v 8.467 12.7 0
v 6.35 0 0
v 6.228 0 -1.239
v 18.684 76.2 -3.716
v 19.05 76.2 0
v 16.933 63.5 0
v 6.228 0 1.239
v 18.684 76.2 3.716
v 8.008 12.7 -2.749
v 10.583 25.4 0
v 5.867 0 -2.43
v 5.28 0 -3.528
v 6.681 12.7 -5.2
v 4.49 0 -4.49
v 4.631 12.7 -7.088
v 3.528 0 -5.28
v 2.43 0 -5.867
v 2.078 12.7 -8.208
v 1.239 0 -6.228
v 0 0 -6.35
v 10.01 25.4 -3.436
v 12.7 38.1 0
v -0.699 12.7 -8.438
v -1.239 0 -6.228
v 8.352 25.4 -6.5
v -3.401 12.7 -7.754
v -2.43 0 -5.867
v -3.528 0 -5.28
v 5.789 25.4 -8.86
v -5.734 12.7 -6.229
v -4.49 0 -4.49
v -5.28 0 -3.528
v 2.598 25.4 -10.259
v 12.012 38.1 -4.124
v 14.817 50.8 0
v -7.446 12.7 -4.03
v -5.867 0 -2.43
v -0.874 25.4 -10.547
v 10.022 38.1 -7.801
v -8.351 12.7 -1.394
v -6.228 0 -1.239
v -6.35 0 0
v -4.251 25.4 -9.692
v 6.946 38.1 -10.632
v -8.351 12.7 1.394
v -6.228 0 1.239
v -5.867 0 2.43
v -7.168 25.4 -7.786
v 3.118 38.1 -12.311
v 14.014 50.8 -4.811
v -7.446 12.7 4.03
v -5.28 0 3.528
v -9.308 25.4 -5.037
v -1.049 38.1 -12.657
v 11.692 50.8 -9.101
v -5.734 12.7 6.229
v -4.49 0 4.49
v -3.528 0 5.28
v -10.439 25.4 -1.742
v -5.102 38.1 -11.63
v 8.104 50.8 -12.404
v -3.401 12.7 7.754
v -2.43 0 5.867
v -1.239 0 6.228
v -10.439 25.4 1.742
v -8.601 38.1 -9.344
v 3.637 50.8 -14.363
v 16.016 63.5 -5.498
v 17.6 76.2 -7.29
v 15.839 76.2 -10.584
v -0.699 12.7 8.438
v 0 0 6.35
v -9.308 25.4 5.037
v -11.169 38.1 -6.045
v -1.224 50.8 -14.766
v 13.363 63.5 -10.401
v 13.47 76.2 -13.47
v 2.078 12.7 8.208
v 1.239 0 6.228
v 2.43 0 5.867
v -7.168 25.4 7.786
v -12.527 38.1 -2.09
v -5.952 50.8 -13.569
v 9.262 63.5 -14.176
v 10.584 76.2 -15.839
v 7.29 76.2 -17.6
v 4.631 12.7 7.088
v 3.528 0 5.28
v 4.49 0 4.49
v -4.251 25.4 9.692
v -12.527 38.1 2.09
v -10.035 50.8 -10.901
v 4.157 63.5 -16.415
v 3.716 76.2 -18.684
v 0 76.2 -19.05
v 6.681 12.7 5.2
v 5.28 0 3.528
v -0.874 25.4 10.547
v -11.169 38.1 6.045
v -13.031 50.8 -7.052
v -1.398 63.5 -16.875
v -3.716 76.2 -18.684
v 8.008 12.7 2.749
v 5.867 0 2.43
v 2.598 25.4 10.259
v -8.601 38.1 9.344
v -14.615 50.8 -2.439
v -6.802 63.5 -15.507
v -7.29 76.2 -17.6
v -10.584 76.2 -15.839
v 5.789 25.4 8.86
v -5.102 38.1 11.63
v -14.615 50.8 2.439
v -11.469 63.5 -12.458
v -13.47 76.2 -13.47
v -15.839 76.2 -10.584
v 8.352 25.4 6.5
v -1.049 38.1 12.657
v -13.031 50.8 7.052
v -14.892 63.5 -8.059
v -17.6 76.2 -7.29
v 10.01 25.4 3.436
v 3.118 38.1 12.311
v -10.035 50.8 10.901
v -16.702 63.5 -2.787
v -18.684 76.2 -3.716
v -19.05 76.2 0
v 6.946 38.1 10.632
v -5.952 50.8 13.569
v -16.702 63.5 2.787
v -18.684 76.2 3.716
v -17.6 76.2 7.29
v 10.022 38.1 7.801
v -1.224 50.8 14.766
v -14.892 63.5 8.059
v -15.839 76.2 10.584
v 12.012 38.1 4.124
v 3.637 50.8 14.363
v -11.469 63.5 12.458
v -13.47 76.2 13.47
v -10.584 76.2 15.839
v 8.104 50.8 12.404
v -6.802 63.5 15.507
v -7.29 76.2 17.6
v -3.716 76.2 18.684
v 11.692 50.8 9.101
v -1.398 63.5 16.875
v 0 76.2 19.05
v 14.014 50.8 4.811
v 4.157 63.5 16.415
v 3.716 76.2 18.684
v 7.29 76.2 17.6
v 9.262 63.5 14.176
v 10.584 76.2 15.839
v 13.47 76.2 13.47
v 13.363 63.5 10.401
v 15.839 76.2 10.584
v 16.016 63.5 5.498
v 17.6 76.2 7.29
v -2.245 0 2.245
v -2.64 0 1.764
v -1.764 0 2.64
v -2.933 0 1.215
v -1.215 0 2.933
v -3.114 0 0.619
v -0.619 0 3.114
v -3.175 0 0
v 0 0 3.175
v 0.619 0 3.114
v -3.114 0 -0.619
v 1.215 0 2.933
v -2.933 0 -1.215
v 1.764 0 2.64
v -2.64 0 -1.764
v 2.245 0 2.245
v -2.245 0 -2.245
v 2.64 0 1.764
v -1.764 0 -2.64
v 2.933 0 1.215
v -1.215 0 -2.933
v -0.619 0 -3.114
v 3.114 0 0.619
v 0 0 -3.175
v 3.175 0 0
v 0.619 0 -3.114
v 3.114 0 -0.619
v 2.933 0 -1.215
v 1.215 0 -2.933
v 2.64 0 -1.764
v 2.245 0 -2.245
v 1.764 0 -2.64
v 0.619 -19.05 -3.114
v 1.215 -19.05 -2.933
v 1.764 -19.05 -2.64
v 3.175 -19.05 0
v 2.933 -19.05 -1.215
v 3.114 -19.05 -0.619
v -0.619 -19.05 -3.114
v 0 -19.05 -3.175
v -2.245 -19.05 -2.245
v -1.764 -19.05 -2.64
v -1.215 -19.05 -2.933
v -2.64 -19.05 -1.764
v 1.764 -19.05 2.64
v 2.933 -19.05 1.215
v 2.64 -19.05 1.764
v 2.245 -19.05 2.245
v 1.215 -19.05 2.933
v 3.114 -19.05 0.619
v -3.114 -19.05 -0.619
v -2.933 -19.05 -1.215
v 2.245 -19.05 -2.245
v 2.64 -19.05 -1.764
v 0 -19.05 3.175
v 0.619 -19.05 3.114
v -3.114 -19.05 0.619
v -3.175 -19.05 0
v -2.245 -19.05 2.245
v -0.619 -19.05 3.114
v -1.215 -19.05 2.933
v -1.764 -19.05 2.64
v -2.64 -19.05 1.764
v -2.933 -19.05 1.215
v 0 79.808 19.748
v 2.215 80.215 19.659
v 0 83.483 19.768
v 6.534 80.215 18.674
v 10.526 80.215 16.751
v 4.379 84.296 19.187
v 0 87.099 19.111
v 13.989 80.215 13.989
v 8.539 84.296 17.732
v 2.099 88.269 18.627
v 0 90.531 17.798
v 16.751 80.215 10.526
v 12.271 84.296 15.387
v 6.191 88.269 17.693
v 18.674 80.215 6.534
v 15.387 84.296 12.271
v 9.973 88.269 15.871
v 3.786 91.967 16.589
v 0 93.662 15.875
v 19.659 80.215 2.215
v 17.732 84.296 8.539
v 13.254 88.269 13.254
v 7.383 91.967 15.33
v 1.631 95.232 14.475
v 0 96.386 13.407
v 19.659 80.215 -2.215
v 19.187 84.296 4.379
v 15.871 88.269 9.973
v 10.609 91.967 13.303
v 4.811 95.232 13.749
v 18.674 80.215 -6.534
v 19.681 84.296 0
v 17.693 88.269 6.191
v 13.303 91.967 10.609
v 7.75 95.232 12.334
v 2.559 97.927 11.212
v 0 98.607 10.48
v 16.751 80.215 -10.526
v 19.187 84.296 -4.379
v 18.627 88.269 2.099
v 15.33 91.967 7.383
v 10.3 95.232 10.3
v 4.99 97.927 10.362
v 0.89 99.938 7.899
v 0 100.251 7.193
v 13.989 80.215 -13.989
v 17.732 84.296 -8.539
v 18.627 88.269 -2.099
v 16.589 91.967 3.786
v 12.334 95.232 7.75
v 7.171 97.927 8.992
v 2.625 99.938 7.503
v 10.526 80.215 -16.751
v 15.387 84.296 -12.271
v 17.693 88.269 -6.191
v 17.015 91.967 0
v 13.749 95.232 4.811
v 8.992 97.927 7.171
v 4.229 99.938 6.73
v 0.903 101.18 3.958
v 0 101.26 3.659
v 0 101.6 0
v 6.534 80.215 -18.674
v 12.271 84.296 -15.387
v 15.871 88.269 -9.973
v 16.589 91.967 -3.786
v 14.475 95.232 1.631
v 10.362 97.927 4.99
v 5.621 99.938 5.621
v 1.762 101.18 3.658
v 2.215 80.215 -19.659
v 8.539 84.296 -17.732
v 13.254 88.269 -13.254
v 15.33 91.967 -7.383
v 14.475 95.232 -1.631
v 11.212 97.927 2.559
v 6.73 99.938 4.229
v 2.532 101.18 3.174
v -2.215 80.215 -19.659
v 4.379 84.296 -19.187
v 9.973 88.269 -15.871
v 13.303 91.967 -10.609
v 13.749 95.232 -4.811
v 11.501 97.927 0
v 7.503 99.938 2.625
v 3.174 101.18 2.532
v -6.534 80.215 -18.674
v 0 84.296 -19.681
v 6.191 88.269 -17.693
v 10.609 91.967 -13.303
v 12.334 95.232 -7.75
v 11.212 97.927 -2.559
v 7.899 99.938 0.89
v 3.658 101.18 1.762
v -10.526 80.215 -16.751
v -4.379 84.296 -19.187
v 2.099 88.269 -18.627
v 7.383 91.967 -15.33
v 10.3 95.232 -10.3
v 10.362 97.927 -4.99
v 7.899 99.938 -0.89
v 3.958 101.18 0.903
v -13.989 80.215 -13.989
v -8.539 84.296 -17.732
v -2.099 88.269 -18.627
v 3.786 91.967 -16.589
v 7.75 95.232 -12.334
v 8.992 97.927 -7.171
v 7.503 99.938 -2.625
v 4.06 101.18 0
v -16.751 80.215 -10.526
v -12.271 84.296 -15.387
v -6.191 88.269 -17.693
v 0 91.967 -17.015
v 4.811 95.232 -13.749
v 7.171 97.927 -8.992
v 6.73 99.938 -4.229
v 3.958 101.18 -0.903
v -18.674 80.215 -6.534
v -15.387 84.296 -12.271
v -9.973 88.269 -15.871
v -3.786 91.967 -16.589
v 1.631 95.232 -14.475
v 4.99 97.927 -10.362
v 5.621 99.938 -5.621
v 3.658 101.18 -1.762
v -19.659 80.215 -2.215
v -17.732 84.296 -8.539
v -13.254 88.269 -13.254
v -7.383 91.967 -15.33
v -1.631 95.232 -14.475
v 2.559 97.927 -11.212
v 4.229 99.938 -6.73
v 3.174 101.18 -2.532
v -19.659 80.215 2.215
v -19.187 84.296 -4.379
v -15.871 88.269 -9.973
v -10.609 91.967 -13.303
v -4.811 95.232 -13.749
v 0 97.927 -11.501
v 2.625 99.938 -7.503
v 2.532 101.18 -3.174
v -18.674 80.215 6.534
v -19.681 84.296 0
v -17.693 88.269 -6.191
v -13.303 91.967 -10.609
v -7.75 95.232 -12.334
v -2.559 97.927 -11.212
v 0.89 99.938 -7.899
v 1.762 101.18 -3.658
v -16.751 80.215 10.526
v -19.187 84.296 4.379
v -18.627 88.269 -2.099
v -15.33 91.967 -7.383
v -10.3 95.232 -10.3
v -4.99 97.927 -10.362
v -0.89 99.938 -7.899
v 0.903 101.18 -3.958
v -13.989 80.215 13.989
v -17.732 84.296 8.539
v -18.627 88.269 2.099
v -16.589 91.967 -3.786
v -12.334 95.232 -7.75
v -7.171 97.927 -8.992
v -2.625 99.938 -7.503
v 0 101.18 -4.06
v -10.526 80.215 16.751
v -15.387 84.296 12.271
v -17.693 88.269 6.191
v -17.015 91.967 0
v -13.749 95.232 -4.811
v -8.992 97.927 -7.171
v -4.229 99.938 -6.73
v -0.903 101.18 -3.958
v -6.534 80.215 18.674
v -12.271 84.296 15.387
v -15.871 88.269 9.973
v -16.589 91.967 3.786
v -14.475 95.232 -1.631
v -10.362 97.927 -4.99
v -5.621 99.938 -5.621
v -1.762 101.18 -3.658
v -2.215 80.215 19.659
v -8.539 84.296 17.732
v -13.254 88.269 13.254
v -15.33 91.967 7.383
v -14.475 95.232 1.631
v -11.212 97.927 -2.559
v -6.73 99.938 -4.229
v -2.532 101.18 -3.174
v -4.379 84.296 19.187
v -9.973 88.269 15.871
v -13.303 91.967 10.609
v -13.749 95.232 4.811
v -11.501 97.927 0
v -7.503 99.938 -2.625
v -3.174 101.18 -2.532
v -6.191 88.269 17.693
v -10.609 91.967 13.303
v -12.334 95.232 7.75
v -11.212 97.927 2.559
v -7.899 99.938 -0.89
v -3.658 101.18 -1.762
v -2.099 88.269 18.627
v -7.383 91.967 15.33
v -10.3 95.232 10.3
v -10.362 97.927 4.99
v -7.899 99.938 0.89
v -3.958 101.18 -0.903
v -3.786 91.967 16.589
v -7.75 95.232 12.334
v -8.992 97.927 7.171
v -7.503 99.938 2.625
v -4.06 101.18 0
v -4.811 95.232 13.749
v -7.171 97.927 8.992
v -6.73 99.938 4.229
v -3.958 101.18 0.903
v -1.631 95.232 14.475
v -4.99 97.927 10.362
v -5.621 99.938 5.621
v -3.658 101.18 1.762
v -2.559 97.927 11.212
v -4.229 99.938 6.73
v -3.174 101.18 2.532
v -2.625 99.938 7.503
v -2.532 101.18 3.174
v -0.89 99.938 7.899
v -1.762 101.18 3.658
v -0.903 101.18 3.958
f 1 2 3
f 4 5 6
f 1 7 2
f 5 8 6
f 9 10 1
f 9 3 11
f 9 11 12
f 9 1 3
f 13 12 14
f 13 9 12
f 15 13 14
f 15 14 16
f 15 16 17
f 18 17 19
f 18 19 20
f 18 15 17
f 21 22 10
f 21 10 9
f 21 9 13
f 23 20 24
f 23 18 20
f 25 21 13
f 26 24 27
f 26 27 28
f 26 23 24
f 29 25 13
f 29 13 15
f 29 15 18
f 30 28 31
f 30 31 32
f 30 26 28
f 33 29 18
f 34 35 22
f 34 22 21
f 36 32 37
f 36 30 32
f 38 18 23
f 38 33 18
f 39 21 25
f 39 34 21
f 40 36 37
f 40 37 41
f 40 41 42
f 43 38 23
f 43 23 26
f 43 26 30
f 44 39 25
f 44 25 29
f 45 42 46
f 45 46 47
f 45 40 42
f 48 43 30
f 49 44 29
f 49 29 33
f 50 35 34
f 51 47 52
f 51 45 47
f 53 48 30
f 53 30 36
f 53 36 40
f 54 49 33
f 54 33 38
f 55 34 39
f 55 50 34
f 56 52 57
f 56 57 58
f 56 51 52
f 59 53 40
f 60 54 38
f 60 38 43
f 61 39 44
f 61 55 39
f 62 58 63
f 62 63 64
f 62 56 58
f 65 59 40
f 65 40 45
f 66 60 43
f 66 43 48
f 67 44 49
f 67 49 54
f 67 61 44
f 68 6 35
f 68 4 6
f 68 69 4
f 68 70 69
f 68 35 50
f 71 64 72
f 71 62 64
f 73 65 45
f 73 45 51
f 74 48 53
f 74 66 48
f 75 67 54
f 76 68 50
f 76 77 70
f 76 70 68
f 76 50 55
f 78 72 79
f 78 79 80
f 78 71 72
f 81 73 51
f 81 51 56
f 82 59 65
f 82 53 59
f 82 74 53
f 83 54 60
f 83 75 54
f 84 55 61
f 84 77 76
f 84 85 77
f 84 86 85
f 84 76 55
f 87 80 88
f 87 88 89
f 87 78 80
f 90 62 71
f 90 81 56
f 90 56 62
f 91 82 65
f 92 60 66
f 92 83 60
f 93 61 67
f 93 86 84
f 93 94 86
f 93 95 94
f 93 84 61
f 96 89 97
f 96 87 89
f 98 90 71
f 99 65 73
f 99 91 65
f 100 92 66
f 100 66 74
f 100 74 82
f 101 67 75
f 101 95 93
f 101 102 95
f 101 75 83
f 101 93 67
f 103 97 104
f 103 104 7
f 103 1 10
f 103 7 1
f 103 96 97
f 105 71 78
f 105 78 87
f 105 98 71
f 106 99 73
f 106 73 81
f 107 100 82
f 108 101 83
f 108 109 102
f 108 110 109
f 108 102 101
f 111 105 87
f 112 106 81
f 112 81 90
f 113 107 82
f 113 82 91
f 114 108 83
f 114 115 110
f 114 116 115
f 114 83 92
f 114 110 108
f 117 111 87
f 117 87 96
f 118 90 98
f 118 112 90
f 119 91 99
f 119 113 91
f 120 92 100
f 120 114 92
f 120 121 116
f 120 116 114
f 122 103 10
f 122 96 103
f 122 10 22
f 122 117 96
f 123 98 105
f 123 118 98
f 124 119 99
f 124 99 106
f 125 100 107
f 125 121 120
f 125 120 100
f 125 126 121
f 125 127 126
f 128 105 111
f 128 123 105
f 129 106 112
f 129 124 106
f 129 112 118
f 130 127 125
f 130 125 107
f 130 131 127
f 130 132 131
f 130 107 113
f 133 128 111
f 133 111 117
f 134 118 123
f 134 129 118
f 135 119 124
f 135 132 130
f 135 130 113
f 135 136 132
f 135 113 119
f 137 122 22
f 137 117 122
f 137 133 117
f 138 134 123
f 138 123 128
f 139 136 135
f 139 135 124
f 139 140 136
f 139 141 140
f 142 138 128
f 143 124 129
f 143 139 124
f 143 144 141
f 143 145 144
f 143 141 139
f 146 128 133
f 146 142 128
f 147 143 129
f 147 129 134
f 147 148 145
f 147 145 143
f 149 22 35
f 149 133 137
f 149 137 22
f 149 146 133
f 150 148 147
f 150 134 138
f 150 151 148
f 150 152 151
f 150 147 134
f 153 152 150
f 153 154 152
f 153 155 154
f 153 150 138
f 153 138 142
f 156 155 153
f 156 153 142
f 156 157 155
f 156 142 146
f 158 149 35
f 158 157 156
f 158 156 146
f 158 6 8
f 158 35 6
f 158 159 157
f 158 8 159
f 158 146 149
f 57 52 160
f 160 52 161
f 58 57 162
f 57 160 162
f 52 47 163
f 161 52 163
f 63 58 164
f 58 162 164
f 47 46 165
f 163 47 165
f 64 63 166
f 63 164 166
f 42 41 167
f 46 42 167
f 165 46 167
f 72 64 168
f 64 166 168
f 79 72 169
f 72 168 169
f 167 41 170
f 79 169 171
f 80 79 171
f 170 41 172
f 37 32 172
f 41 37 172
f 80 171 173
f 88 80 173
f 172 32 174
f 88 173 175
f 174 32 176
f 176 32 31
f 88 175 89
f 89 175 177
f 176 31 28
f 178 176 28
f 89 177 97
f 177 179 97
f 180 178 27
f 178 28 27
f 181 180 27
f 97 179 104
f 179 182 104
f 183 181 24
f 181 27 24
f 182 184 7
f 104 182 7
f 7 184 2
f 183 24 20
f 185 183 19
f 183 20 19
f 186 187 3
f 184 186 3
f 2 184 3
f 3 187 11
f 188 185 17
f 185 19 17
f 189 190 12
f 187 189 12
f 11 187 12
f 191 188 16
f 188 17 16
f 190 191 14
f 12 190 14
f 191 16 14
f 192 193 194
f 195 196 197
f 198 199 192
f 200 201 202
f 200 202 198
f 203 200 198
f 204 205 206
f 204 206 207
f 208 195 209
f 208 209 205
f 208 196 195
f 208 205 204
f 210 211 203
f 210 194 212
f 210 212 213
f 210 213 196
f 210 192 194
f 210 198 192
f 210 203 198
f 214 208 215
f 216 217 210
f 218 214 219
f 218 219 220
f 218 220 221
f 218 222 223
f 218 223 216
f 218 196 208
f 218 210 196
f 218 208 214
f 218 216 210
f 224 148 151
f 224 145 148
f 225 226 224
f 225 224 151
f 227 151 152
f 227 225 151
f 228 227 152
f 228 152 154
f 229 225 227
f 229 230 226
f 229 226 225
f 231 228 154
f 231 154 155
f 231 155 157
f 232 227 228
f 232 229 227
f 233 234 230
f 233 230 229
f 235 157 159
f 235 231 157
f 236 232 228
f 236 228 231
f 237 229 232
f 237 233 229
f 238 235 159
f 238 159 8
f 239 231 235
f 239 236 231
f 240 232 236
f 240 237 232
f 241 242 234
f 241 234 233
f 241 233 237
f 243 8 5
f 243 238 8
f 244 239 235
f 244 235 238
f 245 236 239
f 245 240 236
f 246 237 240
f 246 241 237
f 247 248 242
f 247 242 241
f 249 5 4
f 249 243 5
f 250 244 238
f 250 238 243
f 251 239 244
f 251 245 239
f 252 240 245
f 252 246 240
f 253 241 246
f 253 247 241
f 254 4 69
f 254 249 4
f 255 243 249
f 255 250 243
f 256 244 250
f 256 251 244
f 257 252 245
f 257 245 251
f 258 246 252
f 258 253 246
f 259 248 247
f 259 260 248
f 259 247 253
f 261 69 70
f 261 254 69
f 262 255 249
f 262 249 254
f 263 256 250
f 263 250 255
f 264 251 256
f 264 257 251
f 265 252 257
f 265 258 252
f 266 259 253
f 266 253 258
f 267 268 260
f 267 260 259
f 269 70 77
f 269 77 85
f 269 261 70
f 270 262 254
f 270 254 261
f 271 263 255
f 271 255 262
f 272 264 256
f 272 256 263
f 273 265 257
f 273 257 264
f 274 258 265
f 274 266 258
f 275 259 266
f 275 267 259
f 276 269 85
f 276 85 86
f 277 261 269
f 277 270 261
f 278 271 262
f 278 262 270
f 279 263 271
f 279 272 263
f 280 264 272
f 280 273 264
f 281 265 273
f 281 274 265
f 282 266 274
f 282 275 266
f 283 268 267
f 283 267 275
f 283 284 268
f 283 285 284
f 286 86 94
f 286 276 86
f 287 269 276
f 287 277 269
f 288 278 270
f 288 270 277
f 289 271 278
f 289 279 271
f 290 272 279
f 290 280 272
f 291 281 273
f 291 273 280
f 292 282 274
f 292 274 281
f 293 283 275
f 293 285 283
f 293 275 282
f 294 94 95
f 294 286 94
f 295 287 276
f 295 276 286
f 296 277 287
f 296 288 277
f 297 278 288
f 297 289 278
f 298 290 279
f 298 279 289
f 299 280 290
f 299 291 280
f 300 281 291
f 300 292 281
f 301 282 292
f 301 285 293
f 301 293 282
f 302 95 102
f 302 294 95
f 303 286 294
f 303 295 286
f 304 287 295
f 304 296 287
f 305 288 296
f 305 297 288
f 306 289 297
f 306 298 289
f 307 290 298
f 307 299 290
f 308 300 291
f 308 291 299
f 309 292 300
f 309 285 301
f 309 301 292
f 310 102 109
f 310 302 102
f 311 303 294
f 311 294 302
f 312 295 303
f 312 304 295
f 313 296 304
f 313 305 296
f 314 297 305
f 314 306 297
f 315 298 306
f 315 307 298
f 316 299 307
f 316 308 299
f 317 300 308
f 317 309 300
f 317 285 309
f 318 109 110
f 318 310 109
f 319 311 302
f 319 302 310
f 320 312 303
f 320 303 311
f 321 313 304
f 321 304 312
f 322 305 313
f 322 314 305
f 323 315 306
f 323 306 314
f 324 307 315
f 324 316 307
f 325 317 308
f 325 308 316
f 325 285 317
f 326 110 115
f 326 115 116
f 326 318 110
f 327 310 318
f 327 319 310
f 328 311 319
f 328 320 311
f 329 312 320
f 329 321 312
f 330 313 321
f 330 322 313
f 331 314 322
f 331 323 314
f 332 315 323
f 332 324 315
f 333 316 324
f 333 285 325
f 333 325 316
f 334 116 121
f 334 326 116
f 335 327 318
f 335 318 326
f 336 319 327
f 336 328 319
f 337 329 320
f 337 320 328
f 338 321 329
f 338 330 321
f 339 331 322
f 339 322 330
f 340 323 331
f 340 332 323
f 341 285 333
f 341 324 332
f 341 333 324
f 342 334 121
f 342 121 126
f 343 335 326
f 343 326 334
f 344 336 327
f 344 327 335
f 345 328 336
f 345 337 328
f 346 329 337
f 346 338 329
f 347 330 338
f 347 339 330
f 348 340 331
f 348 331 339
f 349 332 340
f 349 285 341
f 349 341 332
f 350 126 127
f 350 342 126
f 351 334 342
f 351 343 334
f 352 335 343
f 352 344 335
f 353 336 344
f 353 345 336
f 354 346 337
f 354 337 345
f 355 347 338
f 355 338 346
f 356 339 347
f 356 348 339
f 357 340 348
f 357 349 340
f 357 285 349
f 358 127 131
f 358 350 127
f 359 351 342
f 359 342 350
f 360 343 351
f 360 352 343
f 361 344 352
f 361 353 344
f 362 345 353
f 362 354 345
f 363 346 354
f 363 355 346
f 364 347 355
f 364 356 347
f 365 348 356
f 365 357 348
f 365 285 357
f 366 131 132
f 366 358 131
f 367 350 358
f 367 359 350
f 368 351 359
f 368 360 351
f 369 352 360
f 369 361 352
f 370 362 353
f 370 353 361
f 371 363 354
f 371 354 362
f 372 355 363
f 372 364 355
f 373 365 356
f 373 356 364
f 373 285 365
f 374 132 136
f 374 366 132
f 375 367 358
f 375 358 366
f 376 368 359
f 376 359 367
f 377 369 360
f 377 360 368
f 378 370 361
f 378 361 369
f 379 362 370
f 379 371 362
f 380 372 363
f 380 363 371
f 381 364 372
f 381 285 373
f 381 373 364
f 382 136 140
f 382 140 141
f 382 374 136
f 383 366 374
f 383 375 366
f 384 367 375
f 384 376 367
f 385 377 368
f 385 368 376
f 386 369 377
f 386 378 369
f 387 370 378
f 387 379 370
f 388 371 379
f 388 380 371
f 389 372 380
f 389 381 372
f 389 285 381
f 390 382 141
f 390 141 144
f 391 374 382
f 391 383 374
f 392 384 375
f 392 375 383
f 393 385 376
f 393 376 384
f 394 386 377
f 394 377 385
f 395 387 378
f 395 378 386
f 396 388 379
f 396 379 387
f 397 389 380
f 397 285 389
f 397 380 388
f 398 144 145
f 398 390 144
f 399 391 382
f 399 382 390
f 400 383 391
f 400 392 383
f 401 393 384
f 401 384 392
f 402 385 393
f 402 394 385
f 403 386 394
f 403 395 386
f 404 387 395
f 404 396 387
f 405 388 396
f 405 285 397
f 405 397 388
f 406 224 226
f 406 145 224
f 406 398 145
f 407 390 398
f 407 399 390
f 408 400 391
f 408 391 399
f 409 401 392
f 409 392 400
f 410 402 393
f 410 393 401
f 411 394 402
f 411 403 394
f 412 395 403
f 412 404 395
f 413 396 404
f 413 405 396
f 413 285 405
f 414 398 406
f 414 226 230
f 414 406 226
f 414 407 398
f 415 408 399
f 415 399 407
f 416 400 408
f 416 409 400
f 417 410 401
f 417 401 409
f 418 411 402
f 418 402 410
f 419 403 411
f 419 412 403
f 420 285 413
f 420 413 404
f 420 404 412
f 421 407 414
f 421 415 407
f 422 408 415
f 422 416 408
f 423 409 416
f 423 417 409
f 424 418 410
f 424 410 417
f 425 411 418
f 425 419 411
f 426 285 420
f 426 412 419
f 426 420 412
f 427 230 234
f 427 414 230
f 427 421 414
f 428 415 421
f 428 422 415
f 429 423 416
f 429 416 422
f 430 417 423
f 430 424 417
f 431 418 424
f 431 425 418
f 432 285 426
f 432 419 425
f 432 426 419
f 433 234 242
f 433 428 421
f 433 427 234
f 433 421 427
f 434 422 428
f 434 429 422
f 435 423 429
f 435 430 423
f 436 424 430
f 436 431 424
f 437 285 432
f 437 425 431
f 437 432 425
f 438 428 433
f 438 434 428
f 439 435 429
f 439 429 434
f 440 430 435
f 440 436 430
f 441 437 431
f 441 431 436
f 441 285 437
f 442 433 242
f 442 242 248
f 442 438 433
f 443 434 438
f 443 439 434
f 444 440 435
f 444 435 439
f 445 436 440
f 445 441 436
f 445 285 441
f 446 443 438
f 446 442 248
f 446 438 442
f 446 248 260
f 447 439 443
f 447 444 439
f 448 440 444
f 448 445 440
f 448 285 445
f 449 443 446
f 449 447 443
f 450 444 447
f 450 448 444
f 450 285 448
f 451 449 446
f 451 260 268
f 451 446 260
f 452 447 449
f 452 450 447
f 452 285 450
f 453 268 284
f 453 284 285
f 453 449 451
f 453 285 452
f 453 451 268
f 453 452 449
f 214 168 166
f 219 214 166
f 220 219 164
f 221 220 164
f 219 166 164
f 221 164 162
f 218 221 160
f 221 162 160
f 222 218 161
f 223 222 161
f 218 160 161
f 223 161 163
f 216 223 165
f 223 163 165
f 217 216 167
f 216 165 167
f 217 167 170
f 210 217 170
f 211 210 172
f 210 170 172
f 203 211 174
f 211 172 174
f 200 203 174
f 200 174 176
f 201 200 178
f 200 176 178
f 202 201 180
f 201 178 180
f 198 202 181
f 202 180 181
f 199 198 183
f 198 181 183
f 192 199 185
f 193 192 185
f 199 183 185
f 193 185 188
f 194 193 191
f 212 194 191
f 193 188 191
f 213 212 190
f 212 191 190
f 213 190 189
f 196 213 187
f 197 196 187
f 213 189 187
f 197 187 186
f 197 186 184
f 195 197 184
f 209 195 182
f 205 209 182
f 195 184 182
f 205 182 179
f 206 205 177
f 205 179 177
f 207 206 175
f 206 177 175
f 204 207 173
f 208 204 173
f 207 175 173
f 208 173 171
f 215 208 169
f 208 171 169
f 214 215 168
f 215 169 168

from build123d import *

# Parameters (mm, degrees)
SKETCH2_R           = 6.35
SKETCH3_R           = 19.05
SKETCH4_R           = 3.175
BOSS_EXTRUDE1_DEPTH = 19.05
DOME1_FACE_RADIUS   = 19.05
DOME1_HEIGHT        = 25.4


with BuildPart() as part:
    # Sketch2 → Loft1 section 0
    with BuildSketch(Plane(origin=(0, 0, 0), x_dir=(1, 0, 0), z_dir=(0, 1, 0))):
        Circle(SKETCH2_R)
    # Sketch3 → Loft1 section 1
    with BuildSketch(Plane(origin=(0, 76.2, 0), x_dir=(1, 0, 0), z_dir=(0, 1, 0))):
        Circle(SKETCH3_R)
    loft()

    # Sketch4 → Boss-Extrude1 (add)
    with BuildSketch(Plane.XZ):
        with Locations(Location((0, 0, 0), (0, 0, 90))):
            Circle(SKETCH4_R)
    extrude(amount=BOSS_EXTRUDE1_DEPTH)

    # Dome1: a dome of height H over a round flat face of radius A is a cap of a sphere of radius (A * A + H * H) / (2 * H)
    dome1_r = (DOME1_FACE_RADIUS * DOME1_FACE_RADIUS + DOME1_HEIGHT * DOME1_HEIGHT) / (2 * DOME1_HEIGHT)
    dome1_base = Plane((0, 76.2, 0), z_dir=(0, 1, 0))
    with Locations(dome1_base.offset(DOME1_HEIGHT - dome1_r)):
        dome1_ball = Sphere(dome1_r, mode=Mode.PRIVATE)
    add(split(dome1_ball, bisect_by=dome1_base, keep=Keep.TOP, mode=Mode.PRIVATE))


solid = part.part
